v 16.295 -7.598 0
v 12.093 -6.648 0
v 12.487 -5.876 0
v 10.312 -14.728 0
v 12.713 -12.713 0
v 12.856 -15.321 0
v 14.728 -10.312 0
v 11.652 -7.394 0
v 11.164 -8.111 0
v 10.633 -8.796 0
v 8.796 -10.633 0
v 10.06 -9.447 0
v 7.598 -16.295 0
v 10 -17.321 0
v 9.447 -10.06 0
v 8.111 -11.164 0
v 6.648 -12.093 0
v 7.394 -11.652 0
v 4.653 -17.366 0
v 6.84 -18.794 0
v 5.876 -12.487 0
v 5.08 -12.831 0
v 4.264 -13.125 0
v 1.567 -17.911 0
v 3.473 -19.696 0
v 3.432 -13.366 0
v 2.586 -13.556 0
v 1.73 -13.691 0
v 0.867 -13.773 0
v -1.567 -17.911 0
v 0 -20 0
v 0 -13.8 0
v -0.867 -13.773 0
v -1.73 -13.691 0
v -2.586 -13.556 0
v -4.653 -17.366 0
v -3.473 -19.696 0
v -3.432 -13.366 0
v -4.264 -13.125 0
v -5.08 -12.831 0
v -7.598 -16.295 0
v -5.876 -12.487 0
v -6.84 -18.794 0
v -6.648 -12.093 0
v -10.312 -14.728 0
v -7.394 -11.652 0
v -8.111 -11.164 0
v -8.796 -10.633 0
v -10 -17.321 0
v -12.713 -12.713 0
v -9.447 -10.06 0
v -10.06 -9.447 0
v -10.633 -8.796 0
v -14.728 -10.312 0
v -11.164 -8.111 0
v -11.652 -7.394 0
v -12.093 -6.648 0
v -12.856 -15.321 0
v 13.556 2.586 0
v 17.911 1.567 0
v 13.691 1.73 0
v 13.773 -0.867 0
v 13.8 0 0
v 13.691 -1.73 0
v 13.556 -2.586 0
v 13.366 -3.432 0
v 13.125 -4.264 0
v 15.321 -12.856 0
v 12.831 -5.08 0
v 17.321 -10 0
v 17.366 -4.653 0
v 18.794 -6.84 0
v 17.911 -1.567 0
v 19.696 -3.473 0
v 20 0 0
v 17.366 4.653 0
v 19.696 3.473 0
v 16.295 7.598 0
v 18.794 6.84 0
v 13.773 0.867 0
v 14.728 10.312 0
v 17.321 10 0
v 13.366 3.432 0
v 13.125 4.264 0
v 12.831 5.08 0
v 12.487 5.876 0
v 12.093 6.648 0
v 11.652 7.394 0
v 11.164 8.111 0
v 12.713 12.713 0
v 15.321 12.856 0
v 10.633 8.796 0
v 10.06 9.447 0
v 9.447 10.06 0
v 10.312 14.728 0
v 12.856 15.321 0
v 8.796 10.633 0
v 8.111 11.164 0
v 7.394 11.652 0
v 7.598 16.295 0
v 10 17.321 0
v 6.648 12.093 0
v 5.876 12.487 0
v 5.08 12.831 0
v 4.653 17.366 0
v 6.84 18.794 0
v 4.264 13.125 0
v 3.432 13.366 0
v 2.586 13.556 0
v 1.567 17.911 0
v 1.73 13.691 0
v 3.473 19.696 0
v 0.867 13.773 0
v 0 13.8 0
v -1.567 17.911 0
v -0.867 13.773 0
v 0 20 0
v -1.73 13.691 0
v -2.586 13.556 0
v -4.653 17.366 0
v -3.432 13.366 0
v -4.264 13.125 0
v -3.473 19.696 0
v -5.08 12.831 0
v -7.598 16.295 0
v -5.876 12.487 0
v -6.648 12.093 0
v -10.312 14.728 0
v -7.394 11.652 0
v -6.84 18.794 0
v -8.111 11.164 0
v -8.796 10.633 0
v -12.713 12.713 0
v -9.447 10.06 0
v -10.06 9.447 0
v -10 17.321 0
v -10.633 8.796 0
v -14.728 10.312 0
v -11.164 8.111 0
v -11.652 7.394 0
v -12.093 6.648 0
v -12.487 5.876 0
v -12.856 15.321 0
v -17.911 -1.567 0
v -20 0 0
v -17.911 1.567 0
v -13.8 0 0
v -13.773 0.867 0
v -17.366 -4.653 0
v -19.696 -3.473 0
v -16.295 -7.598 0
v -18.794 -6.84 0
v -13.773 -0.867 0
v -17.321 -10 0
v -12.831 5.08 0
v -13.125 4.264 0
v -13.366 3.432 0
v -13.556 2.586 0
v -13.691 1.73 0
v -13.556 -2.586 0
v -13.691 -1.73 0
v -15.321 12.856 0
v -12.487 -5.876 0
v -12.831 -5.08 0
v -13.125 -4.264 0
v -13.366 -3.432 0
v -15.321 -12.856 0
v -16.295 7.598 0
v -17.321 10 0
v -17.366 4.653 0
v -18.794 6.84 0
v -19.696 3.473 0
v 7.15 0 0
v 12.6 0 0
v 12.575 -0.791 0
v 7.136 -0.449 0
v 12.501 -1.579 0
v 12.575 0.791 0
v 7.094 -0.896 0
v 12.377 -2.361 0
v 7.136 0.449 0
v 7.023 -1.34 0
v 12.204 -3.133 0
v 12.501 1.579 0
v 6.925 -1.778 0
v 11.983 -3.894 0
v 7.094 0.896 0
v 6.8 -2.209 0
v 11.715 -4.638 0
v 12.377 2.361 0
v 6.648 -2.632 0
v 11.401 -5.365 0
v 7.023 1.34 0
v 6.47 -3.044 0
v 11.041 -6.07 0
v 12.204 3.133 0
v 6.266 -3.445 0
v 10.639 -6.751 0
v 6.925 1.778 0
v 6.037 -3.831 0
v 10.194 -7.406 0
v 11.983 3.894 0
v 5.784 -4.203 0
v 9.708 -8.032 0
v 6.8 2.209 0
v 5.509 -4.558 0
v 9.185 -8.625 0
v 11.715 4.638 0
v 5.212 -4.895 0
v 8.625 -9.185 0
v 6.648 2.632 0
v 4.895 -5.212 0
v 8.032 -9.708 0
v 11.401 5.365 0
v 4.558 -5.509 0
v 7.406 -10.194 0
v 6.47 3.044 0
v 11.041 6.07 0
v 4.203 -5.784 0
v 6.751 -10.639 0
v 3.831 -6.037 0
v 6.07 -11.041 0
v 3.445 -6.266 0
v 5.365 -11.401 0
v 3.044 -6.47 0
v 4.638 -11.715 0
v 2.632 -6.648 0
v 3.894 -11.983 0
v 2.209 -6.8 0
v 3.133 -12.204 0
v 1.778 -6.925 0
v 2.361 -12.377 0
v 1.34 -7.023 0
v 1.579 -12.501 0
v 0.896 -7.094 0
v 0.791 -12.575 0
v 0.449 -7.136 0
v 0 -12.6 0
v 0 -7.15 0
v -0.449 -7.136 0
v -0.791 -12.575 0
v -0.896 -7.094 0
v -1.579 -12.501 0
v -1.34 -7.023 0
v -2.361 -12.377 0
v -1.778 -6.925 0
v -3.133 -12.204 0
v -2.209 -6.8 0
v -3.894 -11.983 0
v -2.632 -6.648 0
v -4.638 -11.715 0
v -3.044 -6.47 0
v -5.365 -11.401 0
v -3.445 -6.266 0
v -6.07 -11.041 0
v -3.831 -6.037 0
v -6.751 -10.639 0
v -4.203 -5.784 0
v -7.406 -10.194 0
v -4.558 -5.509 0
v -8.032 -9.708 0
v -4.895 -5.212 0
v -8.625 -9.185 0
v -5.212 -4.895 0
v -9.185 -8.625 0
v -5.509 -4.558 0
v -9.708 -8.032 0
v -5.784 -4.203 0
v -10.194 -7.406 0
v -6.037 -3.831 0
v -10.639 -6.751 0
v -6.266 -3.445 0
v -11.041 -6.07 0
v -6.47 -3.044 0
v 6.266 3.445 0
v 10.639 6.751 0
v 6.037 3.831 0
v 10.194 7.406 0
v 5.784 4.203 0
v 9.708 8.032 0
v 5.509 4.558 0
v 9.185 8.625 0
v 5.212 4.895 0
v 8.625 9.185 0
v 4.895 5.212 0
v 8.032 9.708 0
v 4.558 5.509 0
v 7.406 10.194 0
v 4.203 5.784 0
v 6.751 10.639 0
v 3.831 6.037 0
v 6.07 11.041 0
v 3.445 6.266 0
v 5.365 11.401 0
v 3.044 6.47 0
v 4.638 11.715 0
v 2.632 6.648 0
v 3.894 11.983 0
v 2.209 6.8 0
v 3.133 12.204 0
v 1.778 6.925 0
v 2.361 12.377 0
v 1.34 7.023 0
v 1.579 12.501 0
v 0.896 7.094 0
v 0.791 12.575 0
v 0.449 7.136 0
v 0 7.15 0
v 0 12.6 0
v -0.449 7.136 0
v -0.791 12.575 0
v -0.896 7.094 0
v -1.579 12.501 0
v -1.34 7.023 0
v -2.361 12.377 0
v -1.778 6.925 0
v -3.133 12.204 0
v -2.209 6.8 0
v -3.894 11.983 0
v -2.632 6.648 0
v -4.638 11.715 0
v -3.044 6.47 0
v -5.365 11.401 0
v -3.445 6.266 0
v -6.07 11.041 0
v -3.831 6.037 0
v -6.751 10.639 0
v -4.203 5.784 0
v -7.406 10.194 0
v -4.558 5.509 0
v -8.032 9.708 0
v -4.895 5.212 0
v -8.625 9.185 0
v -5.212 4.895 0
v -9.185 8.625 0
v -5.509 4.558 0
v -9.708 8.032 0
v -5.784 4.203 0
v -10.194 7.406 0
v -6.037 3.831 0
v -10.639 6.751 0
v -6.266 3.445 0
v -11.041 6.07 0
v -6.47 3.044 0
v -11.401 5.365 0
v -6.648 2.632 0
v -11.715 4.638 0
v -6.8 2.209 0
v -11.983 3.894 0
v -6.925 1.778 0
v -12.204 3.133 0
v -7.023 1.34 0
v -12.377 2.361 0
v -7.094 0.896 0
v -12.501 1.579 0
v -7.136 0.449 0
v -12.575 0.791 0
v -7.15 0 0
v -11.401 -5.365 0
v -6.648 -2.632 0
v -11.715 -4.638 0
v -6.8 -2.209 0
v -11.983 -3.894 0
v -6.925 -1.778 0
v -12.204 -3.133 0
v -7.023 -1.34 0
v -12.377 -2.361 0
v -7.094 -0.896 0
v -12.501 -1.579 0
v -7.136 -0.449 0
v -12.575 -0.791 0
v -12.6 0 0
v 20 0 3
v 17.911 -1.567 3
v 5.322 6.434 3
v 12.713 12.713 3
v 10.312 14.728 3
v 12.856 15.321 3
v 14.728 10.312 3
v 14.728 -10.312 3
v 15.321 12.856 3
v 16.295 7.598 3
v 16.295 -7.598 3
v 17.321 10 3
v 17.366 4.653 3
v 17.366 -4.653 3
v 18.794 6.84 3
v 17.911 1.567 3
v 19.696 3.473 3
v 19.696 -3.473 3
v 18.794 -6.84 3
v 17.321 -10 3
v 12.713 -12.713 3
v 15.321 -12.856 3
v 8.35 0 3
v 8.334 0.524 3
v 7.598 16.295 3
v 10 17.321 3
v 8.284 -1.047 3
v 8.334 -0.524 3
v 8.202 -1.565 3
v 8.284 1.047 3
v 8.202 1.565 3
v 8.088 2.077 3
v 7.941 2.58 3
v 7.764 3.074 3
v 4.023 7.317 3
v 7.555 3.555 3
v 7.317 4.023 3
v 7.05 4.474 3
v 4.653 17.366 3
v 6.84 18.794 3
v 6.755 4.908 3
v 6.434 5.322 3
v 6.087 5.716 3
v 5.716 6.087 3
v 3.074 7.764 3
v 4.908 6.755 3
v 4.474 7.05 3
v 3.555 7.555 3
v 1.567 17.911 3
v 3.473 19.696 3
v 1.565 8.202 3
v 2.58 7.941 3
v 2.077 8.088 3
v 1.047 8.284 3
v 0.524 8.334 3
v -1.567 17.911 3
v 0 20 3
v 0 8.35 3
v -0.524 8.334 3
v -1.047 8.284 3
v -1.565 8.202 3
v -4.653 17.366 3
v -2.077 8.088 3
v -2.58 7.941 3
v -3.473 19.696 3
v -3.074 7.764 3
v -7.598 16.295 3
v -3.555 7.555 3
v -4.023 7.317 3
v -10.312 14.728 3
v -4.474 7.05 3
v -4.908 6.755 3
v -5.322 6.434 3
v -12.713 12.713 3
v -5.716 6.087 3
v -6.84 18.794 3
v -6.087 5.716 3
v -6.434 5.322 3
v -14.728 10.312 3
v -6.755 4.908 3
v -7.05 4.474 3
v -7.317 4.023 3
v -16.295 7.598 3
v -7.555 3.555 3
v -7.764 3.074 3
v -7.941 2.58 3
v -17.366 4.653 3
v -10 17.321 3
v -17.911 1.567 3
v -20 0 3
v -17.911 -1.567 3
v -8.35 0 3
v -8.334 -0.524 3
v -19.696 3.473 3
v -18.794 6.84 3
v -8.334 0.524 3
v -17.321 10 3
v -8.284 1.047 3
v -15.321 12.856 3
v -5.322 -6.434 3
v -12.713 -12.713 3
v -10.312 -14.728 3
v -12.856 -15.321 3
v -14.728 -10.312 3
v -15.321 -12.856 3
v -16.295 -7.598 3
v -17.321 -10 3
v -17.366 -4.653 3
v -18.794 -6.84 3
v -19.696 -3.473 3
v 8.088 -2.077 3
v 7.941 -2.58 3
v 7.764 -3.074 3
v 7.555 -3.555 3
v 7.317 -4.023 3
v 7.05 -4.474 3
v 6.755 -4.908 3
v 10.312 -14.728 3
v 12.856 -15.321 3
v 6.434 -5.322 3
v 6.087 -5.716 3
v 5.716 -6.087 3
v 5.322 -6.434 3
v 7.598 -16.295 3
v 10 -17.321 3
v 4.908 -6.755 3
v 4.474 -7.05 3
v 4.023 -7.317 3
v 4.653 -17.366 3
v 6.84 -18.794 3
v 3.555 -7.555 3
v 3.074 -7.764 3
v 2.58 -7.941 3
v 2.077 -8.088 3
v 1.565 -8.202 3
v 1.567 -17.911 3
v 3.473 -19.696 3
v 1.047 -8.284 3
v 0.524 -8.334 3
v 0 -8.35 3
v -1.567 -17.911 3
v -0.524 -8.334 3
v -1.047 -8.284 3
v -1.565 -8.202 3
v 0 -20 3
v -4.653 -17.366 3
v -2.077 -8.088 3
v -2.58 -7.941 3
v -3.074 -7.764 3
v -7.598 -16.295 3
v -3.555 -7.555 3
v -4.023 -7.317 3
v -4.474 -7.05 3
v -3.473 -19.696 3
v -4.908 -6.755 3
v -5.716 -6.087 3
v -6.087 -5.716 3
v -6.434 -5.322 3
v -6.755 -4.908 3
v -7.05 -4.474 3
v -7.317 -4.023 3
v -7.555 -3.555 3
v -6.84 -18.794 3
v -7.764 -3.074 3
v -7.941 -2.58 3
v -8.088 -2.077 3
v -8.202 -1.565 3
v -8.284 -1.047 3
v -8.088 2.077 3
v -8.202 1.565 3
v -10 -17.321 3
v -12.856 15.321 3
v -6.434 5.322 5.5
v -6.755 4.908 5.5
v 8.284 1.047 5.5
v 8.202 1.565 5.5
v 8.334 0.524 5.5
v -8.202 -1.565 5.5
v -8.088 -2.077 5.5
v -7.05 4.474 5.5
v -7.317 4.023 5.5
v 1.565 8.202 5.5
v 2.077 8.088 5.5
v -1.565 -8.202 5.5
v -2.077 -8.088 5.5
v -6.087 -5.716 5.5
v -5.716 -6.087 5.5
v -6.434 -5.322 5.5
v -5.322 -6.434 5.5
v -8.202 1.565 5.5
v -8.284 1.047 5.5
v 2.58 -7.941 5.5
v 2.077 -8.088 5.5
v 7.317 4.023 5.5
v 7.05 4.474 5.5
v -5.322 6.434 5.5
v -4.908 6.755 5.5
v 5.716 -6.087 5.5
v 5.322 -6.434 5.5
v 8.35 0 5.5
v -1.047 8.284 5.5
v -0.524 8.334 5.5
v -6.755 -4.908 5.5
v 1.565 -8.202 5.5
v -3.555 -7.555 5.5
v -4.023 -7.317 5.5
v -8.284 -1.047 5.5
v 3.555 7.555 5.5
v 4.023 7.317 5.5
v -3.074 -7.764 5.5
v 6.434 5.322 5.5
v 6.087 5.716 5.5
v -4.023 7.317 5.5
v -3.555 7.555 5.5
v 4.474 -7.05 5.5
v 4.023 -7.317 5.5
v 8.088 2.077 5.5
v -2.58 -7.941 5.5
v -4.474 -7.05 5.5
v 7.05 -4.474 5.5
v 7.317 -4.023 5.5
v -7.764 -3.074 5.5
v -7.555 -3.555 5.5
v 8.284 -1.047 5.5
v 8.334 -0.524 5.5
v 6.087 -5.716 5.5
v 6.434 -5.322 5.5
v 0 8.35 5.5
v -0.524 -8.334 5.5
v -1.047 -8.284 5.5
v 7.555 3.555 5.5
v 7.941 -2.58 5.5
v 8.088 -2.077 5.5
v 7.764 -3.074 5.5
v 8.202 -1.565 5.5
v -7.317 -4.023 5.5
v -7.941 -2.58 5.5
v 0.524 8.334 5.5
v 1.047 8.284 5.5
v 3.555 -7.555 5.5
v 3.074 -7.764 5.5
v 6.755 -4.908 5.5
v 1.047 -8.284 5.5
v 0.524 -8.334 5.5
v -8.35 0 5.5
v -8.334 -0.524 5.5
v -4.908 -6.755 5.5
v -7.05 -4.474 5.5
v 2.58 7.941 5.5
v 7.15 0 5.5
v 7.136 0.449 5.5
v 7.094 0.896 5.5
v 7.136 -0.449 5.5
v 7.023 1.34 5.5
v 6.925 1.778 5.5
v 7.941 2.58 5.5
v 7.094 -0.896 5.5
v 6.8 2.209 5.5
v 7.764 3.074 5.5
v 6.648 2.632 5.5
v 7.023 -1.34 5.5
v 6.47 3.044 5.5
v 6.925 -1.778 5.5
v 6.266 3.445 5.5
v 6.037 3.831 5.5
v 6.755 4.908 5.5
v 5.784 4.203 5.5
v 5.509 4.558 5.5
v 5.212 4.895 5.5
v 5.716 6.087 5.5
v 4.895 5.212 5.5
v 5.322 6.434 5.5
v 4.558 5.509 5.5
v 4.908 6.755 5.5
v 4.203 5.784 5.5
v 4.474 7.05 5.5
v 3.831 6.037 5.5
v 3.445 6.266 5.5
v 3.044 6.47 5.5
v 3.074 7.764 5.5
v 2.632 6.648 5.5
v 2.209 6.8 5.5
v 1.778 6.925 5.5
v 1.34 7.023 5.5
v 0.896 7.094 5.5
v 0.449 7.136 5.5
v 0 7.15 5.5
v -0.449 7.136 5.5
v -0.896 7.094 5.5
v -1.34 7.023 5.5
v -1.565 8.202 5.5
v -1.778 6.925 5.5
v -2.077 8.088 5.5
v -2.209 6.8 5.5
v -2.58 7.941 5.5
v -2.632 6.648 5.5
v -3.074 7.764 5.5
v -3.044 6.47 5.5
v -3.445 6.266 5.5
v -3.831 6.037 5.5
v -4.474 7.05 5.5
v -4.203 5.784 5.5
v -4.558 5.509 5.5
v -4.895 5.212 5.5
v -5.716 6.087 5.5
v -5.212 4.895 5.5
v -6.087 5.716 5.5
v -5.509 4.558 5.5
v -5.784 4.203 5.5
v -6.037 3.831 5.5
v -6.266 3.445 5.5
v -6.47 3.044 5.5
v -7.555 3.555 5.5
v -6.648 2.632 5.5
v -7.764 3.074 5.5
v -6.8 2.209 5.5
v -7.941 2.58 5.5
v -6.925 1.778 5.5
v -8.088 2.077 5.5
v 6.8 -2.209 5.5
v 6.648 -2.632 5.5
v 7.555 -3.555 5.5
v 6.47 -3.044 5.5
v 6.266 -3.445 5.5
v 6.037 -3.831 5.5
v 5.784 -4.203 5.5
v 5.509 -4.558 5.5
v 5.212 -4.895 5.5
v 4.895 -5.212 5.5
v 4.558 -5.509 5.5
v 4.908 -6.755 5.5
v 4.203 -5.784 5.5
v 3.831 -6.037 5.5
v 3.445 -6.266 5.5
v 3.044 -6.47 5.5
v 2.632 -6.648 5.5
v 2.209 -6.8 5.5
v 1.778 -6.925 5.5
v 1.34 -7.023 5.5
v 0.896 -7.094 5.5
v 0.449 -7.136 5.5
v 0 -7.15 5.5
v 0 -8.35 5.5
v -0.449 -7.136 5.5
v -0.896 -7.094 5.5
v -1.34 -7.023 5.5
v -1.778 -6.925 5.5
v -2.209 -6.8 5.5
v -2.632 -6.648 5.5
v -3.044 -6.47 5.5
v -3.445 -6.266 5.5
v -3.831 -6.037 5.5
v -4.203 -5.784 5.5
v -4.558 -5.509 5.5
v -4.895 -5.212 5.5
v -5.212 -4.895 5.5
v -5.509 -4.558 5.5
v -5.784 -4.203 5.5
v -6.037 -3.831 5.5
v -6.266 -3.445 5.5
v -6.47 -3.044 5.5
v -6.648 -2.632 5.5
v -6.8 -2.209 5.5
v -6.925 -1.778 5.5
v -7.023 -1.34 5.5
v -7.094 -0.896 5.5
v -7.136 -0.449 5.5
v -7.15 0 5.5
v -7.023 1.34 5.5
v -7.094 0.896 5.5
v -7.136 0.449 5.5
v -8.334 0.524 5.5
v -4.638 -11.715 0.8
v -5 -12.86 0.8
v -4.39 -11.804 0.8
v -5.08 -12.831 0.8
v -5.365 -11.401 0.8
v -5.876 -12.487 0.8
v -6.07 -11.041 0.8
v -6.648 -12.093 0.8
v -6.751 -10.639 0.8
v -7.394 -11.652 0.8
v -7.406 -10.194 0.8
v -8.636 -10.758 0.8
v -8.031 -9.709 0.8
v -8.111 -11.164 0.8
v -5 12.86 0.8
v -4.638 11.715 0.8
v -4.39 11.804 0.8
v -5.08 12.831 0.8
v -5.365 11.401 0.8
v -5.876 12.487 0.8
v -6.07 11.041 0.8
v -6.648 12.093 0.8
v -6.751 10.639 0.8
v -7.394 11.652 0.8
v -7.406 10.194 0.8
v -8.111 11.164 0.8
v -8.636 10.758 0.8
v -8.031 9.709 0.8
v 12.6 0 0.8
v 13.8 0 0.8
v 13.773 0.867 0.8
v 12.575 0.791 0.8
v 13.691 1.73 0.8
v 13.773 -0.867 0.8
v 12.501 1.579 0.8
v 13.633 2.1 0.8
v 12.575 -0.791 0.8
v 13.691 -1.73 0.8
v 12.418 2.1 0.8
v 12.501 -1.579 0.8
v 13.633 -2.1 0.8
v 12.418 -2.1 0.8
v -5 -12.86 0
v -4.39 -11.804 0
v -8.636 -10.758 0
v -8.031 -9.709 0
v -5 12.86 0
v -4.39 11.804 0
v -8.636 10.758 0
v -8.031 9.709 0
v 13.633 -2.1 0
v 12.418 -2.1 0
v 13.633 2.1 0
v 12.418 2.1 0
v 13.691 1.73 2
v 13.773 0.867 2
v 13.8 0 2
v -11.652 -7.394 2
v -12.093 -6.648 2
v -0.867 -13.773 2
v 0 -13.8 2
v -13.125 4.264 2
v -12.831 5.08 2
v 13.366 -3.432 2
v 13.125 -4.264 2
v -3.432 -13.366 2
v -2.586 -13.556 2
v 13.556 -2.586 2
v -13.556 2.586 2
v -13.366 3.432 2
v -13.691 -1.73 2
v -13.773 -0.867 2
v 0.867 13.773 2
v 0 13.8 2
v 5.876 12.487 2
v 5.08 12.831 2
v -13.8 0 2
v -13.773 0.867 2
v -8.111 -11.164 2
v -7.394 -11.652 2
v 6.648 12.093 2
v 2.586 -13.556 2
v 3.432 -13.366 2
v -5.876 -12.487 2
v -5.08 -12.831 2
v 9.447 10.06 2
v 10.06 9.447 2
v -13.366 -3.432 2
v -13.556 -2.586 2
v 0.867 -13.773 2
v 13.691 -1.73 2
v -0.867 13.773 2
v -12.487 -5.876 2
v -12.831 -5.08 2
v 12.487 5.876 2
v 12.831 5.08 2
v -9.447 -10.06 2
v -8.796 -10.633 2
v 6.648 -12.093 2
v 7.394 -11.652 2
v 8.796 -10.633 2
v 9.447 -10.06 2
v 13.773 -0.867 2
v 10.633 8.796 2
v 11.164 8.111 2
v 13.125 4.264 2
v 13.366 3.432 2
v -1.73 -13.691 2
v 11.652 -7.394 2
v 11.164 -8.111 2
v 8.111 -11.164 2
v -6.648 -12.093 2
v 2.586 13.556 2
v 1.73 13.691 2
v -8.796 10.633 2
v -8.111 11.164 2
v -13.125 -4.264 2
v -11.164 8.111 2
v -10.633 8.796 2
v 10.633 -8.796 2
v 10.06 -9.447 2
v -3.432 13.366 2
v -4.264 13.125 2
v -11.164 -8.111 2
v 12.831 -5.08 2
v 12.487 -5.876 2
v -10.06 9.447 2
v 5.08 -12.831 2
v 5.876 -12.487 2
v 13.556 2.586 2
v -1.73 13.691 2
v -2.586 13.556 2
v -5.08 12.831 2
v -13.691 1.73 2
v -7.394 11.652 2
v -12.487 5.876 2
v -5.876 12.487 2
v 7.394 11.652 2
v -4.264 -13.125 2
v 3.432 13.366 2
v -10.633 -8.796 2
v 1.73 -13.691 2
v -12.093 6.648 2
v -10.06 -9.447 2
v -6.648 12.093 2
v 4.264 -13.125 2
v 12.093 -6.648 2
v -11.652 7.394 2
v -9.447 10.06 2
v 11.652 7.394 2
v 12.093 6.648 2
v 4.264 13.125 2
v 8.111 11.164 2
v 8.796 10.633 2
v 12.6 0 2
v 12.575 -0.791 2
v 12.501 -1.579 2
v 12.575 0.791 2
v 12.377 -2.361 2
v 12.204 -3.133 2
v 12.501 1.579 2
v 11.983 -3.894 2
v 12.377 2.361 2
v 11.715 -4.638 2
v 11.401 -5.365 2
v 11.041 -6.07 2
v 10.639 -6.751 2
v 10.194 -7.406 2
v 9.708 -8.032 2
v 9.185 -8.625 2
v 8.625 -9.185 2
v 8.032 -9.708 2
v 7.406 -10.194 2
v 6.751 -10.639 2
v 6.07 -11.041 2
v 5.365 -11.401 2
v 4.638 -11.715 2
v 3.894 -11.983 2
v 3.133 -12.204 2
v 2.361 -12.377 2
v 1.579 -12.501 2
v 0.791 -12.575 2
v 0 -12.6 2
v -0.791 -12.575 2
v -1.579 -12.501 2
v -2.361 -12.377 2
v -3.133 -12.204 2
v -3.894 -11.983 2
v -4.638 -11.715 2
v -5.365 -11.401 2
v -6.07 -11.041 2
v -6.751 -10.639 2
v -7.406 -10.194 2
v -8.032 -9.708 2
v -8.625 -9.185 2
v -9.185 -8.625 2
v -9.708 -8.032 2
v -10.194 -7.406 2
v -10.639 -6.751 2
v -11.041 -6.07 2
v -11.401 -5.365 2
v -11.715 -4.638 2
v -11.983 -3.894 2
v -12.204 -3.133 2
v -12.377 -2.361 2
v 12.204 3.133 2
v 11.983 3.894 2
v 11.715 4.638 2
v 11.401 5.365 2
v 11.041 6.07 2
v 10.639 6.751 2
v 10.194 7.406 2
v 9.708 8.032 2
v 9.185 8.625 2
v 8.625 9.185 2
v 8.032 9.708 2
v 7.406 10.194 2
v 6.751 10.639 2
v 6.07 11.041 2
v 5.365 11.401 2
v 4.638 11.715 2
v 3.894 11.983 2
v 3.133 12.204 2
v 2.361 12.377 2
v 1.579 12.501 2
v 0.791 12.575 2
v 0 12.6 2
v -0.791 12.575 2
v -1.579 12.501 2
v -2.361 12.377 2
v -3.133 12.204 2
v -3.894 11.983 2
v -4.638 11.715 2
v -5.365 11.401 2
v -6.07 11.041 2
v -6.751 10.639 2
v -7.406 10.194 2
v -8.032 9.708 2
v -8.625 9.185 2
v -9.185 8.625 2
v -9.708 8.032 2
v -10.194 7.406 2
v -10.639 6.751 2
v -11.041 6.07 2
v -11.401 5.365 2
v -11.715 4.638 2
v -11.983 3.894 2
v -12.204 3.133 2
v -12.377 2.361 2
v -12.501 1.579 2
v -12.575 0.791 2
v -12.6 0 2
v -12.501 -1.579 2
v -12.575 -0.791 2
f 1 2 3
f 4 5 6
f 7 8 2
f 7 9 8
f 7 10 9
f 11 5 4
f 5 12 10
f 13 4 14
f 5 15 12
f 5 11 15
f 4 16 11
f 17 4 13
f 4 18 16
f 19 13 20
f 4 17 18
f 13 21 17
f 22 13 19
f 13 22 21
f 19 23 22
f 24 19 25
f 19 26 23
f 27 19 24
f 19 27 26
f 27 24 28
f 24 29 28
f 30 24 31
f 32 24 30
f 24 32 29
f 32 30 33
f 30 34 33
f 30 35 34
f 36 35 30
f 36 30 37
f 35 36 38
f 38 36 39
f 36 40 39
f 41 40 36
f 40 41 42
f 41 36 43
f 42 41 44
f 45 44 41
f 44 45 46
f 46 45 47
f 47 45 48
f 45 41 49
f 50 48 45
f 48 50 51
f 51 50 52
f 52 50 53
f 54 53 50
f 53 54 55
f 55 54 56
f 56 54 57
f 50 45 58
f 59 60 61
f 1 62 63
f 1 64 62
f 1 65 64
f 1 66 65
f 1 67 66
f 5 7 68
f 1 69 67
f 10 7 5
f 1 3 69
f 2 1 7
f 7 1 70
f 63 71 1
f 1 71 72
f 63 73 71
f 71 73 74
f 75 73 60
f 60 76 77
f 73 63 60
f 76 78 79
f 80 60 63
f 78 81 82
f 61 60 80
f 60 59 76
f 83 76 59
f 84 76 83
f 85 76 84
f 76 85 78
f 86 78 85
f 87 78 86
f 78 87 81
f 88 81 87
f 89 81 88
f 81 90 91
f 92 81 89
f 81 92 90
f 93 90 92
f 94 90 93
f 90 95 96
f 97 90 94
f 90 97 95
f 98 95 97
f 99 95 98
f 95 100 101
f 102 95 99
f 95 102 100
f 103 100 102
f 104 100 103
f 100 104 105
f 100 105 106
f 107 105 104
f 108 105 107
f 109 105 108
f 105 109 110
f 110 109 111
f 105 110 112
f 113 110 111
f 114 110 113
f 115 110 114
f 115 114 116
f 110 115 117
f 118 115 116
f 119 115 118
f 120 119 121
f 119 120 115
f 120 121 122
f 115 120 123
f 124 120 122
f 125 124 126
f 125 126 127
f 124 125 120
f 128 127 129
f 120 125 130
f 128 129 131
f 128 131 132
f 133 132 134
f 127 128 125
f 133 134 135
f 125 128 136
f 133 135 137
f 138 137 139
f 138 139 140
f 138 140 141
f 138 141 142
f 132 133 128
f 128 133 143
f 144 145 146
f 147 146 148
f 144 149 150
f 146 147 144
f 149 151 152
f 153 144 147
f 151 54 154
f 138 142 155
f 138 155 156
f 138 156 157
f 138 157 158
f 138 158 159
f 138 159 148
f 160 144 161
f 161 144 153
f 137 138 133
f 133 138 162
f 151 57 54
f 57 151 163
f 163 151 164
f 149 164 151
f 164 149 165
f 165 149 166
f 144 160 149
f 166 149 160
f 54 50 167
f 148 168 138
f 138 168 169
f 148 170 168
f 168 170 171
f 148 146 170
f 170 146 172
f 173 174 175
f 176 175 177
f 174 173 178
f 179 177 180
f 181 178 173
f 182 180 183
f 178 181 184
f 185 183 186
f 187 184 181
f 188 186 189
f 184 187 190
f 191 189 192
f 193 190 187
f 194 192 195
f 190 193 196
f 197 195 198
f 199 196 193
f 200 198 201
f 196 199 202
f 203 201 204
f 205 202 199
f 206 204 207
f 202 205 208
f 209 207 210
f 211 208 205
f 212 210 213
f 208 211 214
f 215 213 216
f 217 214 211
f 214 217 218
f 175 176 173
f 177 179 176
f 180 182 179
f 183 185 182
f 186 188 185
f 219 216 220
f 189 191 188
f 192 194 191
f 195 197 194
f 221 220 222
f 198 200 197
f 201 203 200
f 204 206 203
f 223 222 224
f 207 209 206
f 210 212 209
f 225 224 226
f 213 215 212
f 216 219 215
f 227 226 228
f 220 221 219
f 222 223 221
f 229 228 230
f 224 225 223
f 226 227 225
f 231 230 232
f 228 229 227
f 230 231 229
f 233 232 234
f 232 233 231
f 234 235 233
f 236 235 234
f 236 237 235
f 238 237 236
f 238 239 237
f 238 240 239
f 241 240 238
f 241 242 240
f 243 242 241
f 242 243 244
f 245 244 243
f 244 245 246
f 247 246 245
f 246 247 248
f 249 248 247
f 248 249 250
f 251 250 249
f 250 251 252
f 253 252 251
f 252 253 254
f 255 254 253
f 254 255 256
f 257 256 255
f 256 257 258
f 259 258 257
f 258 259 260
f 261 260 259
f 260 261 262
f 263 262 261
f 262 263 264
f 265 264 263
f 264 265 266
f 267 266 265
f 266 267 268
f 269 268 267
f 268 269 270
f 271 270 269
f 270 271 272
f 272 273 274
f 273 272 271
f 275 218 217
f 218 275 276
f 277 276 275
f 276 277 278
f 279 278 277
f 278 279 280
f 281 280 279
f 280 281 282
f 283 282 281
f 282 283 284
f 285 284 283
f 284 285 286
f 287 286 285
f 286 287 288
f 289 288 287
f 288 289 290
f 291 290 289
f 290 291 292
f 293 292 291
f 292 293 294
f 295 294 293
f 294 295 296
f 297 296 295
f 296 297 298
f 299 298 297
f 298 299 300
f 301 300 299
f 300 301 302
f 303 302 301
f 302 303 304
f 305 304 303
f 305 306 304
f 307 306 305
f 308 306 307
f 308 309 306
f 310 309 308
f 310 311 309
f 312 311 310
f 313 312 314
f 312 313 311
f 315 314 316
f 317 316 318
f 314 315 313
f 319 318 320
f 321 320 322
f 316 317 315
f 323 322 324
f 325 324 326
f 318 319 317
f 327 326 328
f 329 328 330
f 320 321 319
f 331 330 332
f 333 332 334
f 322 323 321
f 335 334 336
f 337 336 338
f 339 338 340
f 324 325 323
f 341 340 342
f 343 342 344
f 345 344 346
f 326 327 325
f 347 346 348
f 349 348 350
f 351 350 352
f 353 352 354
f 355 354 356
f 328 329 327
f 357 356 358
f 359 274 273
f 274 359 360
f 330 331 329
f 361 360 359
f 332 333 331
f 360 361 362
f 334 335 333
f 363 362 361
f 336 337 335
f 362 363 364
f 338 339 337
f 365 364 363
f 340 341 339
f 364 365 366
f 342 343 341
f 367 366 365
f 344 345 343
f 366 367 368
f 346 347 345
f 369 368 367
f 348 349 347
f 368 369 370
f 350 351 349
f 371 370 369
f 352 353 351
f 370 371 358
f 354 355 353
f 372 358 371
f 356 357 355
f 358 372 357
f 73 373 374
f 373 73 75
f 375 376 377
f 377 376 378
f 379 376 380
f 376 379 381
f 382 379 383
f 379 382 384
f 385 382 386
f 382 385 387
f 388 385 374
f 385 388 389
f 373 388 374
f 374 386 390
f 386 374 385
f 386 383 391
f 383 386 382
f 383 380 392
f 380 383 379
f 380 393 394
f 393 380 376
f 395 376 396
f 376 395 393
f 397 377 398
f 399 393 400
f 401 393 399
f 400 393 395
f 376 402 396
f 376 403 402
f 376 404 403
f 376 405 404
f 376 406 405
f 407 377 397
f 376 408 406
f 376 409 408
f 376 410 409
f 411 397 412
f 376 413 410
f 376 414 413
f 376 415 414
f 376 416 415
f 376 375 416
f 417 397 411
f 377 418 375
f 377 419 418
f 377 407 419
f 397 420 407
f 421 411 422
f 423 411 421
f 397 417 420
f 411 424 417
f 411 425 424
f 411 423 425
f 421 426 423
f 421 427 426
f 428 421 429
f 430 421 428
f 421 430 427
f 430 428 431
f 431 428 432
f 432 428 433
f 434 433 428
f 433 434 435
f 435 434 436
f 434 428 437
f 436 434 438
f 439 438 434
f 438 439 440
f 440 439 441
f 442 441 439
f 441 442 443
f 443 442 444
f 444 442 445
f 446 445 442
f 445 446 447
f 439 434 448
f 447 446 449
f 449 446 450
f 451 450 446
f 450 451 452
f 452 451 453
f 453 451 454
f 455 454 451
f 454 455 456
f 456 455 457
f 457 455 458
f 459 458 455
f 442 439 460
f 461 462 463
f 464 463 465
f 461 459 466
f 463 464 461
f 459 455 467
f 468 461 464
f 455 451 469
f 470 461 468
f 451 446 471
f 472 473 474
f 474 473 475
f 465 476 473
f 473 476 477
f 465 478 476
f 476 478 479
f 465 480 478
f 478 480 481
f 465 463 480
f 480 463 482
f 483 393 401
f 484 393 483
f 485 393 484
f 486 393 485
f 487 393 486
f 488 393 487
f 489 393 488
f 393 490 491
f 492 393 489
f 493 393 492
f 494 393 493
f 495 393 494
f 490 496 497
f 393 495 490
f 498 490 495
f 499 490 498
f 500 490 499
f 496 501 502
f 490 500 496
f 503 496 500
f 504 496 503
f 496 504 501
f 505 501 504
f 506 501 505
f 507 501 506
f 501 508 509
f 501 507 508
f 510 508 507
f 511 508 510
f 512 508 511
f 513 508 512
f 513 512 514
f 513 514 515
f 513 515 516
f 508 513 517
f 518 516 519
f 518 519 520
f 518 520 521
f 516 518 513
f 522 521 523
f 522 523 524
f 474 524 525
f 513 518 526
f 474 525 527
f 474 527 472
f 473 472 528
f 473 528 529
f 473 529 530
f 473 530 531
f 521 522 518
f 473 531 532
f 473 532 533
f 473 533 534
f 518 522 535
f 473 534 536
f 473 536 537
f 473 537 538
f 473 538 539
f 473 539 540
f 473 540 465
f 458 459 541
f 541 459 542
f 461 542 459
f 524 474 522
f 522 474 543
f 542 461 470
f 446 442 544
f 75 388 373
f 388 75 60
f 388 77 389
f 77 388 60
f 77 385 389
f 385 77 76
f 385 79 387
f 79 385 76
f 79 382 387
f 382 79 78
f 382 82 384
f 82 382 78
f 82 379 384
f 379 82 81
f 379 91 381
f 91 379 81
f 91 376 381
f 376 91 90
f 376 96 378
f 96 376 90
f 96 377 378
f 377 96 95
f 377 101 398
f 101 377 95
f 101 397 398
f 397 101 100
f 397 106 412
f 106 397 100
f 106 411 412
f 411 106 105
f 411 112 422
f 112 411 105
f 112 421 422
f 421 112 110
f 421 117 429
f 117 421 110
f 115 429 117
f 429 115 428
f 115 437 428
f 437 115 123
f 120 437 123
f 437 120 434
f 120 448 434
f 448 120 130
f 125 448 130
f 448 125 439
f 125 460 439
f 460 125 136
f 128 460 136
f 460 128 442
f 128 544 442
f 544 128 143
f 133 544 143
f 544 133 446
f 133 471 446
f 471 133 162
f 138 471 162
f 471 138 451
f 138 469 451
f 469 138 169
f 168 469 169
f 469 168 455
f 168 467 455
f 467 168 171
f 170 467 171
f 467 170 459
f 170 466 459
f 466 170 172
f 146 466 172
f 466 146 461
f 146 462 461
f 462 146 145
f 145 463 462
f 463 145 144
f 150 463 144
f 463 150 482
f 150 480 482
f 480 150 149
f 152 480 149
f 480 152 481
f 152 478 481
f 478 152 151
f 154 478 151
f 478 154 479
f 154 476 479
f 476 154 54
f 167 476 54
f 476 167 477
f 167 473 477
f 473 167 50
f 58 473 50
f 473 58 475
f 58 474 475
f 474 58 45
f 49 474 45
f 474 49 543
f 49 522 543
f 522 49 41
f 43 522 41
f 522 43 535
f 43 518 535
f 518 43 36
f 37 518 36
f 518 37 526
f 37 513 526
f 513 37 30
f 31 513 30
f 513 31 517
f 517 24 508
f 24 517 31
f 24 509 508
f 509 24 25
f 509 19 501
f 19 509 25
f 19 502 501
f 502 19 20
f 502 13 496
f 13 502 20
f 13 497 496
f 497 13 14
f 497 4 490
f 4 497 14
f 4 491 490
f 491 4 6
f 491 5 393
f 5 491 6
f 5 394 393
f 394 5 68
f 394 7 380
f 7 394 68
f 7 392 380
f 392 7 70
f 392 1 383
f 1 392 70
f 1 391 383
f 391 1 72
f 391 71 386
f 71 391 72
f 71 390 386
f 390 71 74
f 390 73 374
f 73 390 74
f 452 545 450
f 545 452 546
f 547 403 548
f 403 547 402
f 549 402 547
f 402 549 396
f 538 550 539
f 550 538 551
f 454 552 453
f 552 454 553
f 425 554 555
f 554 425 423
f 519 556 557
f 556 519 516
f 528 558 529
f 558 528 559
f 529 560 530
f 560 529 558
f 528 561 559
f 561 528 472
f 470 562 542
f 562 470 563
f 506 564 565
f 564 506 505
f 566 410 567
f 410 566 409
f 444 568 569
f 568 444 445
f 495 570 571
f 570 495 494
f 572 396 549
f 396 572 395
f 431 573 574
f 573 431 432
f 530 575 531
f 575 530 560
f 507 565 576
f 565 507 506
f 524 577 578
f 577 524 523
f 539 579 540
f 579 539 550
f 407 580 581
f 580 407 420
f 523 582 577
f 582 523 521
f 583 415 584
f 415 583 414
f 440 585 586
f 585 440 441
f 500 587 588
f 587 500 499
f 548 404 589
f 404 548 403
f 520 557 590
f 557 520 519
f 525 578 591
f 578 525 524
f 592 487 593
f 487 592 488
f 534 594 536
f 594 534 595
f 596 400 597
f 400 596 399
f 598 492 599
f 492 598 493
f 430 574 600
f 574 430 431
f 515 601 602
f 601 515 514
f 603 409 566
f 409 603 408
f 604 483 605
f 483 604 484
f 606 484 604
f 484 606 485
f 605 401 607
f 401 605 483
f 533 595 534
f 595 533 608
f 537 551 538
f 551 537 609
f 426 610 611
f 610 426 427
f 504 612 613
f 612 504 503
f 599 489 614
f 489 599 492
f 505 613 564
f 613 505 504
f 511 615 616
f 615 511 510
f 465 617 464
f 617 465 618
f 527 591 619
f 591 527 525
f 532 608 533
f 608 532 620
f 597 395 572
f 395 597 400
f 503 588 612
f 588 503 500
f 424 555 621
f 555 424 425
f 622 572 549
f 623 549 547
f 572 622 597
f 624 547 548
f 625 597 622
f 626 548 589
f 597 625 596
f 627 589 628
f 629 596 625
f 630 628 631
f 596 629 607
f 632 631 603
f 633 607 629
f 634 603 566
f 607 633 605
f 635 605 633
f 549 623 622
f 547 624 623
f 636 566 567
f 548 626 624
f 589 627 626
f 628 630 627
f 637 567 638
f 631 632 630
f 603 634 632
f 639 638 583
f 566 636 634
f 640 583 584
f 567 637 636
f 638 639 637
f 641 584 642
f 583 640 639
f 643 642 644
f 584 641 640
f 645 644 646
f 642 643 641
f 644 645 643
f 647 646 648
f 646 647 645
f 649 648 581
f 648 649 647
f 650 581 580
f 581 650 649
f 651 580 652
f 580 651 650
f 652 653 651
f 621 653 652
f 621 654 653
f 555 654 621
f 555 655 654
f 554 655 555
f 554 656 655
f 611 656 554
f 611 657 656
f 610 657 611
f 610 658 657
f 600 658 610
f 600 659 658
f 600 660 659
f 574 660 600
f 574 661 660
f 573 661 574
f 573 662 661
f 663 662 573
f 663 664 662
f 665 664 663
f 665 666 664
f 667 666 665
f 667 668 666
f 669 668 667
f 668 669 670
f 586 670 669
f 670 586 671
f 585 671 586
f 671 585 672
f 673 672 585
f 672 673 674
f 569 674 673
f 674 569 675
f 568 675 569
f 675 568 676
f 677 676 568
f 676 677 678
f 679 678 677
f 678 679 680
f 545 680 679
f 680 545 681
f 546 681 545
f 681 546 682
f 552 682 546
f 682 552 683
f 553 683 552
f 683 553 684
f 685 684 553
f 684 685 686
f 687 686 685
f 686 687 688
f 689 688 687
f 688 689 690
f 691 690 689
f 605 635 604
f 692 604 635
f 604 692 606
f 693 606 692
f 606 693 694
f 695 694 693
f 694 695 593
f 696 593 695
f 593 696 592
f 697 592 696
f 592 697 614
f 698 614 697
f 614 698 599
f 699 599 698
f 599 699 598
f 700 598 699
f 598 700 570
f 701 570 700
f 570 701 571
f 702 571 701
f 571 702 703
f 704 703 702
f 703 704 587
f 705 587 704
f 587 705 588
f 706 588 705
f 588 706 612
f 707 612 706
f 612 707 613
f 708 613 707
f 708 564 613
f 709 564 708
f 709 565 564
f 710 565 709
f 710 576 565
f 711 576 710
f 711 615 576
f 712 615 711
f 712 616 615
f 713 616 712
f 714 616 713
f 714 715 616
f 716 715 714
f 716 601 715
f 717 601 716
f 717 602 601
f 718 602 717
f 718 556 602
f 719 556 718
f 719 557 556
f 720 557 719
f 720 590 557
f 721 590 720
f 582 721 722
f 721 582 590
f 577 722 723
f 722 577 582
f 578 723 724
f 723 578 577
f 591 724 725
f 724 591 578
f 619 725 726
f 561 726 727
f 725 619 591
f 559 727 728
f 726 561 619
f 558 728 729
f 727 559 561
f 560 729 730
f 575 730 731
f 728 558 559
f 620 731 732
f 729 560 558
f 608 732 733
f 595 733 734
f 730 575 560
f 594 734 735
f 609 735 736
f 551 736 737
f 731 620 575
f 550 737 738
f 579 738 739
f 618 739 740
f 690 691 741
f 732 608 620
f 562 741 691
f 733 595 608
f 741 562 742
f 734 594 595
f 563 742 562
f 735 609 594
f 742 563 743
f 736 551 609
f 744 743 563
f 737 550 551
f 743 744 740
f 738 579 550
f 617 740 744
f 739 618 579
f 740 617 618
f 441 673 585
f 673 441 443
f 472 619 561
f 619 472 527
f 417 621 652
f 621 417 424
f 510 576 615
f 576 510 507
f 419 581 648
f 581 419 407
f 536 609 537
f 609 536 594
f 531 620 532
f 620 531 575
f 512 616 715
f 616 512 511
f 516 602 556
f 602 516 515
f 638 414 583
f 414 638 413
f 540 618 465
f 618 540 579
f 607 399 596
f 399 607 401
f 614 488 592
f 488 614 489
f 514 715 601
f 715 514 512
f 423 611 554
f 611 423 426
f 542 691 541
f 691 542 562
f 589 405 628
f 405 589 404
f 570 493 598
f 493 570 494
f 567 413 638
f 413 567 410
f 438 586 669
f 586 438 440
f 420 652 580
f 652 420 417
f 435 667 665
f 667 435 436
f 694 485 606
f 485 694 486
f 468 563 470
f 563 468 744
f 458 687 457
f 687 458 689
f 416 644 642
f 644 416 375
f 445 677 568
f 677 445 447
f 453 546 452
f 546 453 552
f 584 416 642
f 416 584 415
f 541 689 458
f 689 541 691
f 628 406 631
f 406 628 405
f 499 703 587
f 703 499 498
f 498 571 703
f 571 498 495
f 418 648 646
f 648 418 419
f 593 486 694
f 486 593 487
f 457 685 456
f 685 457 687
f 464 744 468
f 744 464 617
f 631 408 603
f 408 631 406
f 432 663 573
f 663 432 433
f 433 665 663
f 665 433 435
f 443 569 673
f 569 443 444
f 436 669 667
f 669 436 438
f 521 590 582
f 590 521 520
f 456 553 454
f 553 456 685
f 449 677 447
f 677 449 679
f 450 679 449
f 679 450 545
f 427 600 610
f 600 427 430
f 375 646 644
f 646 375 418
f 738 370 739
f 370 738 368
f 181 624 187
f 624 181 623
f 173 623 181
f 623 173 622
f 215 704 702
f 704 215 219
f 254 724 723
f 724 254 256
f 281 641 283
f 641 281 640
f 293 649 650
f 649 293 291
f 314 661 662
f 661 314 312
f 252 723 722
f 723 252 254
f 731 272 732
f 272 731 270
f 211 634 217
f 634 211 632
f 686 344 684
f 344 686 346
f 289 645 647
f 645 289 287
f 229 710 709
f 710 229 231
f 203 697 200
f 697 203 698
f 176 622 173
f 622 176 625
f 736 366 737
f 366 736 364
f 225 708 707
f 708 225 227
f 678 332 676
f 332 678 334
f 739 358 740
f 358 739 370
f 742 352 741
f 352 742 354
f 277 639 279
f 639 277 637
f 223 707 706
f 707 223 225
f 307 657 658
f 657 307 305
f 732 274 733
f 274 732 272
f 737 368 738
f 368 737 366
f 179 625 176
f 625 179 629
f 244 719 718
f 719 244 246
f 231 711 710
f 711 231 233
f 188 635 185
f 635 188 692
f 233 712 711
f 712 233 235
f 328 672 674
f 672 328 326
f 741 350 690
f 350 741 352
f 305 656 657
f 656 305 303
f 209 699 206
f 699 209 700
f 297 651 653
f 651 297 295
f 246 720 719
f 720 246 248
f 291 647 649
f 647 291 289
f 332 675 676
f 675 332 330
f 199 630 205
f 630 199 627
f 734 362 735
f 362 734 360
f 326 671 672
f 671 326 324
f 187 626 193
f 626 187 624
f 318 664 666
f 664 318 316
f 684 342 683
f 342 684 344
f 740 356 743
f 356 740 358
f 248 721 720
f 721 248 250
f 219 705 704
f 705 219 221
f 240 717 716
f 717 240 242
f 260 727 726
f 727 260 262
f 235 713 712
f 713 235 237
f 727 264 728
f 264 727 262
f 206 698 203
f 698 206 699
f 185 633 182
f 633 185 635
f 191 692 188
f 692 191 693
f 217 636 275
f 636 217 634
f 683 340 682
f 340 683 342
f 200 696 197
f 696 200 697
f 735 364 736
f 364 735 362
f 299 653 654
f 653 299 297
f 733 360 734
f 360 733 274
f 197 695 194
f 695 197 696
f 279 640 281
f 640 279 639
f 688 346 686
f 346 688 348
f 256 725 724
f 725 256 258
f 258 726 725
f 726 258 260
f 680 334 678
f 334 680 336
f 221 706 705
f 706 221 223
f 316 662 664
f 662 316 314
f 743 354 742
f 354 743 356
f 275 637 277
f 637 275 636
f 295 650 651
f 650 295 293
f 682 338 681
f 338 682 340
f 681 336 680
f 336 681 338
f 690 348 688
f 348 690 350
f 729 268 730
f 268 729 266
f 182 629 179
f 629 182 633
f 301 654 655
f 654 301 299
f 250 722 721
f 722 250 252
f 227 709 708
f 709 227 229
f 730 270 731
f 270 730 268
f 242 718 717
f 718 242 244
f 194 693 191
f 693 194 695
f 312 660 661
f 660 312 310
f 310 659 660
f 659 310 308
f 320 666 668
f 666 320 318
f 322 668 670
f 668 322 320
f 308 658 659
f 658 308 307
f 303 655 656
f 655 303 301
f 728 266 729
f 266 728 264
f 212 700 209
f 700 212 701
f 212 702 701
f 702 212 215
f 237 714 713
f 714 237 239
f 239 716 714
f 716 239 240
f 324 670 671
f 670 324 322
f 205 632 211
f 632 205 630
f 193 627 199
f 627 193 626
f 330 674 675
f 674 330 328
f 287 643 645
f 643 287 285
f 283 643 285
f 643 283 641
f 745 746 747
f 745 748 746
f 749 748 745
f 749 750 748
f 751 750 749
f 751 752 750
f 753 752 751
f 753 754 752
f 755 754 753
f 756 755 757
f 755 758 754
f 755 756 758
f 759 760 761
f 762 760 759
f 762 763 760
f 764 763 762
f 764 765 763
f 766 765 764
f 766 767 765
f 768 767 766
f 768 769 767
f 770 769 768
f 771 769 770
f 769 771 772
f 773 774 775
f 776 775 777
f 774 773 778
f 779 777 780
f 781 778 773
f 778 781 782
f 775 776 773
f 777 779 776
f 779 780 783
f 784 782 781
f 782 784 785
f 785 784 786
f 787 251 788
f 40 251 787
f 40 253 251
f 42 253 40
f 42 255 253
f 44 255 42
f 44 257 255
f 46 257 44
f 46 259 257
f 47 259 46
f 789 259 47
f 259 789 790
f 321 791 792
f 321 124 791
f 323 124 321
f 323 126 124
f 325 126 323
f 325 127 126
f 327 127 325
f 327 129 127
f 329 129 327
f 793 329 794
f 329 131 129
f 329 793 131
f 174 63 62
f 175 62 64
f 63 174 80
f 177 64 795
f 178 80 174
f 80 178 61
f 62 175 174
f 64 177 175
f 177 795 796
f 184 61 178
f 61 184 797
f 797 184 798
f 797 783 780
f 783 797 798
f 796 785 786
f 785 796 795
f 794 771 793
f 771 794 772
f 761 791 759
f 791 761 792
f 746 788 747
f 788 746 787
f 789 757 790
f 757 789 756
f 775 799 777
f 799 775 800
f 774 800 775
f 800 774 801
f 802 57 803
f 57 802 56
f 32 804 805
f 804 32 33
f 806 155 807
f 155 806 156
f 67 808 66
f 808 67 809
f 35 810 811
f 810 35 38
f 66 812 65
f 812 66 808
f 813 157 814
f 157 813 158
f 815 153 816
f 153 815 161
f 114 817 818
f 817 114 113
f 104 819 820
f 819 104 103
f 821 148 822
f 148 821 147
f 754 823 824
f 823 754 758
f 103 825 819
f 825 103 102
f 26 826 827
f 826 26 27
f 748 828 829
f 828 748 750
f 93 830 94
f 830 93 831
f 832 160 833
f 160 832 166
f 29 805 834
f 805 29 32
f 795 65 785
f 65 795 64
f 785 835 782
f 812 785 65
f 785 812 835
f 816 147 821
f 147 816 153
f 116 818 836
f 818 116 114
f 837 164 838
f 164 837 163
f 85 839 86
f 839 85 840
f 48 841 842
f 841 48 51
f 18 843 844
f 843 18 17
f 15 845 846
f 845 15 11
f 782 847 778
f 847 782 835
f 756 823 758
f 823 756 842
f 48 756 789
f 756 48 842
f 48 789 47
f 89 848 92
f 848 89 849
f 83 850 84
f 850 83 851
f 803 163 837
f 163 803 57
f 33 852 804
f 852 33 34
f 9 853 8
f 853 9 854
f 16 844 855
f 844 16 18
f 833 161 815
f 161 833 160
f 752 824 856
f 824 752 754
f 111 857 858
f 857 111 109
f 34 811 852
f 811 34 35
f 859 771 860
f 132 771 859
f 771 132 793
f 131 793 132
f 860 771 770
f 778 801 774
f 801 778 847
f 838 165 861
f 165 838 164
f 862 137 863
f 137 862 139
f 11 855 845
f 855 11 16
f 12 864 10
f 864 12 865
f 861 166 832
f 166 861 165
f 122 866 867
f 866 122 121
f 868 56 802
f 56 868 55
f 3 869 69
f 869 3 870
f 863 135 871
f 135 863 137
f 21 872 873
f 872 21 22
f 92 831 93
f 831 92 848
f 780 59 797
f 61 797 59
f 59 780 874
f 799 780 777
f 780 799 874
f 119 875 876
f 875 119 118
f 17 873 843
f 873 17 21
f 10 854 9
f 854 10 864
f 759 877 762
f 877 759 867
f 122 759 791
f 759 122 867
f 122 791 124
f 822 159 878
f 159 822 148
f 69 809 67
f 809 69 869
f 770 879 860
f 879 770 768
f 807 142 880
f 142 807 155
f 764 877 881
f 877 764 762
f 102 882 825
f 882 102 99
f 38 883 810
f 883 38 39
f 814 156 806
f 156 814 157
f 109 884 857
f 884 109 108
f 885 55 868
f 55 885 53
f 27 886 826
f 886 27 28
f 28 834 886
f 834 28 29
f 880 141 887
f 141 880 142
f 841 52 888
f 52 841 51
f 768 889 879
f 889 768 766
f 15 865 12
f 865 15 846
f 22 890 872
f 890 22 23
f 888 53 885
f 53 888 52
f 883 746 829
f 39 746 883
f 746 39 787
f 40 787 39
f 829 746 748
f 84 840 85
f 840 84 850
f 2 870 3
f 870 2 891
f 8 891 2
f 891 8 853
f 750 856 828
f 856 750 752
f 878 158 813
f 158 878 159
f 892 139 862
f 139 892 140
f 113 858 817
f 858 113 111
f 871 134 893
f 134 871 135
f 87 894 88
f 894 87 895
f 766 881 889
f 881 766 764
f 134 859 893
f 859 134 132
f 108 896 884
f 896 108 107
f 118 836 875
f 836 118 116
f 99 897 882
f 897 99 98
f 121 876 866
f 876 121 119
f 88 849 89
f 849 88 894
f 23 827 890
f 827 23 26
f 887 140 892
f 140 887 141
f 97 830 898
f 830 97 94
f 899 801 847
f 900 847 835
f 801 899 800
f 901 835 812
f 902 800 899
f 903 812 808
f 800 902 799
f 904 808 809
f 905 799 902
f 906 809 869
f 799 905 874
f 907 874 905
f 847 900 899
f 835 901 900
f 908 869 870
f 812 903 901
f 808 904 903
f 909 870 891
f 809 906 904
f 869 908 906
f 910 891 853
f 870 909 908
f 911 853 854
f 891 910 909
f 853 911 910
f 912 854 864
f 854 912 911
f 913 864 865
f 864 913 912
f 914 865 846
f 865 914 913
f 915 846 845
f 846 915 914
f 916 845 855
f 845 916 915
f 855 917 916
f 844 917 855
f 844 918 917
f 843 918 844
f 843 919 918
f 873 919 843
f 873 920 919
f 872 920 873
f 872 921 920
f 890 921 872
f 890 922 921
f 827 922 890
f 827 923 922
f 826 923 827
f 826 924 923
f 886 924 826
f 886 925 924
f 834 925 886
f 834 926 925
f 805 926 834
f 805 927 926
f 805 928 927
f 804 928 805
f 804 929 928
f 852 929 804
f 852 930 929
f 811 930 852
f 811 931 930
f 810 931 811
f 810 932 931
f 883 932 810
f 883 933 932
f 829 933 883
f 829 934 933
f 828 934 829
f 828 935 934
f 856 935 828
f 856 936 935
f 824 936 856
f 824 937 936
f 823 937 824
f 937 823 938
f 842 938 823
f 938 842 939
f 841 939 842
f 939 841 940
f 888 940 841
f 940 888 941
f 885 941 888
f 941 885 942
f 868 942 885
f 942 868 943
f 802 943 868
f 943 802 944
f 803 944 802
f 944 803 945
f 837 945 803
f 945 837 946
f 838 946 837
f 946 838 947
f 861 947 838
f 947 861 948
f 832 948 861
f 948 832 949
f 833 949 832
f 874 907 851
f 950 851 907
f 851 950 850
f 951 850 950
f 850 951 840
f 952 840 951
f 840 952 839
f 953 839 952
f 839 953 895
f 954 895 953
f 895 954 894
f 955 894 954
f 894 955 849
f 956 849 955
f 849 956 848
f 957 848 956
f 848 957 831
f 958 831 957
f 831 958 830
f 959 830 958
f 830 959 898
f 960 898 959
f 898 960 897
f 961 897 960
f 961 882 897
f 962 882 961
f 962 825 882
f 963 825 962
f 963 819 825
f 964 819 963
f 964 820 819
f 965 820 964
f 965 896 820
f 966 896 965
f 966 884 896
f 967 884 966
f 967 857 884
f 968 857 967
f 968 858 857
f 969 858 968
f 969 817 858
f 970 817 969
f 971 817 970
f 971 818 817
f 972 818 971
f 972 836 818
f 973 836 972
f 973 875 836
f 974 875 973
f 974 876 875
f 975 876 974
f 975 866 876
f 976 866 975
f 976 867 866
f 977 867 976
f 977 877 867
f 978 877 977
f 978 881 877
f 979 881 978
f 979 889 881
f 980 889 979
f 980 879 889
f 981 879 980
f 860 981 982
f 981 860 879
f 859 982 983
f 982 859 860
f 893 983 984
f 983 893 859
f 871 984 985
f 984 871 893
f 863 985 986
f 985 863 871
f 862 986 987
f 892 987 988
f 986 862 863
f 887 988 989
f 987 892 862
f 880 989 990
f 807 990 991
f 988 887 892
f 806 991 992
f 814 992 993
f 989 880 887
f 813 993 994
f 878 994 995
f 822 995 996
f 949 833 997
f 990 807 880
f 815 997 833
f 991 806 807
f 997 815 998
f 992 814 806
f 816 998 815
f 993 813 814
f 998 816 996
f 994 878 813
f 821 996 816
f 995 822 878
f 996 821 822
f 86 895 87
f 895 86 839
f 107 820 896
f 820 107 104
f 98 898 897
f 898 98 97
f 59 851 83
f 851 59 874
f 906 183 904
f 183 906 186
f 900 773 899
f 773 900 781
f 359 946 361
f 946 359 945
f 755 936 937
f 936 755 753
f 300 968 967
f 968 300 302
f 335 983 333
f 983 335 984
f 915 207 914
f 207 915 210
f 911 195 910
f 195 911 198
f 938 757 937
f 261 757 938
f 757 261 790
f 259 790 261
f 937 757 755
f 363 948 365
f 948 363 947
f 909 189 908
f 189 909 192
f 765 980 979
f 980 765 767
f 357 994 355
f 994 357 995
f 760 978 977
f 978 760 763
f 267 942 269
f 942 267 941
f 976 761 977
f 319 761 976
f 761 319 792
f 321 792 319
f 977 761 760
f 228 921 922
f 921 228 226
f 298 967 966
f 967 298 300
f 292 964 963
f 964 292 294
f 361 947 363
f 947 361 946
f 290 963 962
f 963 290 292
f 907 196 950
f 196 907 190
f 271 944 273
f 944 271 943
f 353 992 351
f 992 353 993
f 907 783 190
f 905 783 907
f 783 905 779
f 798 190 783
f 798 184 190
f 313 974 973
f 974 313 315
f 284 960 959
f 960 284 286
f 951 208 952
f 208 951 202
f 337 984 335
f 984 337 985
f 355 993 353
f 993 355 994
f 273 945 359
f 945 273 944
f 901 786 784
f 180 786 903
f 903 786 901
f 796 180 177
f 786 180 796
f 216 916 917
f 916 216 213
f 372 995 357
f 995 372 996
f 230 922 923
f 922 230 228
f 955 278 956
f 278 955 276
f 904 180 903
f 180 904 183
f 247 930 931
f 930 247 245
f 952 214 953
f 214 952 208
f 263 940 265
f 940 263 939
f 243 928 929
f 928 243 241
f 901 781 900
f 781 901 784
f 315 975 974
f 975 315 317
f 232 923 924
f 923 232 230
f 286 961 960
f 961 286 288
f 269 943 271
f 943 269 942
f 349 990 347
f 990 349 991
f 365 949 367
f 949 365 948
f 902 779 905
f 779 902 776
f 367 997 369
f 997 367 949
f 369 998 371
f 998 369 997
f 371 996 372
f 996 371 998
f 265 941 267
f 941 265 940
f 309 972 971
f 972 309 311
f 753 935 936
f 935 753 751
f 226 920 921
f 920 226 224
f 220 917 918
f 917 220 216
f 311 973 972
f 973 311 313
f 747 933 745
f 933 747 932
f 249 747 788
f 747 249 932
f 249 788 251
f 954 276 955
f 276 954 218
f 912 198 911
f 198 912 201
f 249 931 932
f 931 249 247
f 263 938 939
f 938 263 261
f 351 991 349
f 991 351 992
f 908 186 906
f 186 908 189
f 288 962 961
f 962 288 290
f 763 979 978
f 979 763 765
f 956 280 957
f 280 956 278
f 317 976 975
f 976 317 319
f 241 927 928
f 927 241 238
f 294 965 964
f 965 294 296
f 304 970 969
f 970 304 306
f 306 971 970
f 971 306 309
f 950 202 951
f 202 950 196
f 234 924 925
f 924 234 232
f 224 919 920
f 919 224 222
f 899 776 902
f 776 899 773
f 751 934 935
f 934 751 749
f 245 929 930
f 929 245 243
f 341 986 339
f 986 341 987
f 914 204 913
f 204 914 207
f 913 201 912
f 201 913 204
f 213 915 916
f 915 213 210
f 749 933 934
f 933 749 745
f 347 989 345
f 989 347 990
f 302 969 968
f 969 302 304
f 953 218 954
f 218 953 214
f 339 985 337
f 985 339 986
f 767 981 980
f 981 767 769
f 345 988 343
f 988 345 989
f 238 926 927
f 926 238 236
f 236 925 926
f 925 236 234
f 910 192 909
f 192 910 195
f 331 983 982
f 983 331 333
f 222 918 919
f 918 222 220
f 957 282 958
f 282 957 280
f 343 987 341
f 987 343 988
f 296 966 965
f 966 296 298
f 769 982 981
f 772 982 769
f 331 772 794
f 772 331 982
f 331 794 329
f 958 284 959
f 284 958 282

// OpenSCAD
/*
    With this code you can make a focus wheel extension for the M12 lenses used in the FluoPi project.
    
    Isaac Núñez 2020 (CC BY 4.0; https://creativecommons.org/licenses/by/4.0/) 
 
*/


////////////////////////////////////
//  Parameters  //

// This values have to be the same as in the filter holder to them to be compatible
ri = 12.6;
side_thick = 1*1.2 ; // 1.2 times to let the clam enter
h_clam = 2;
h = h_clam * 2;
thick_frac = 0.4 ; // free space fraction of clam thickness
free_clam_space = 4.2;
angles1 = [0,120,240];
angles2 = [20,140,260]; // 2 more degree to let the clam enter
// until here

///////////////
//wheel values

r_wheel = 20; //wheel radii
w_thick = 3;
thoot_size = 2; //

/////////////////
// M12 aperture

M12_ri = 7.15 ;
M12_side_thick = 2.5;
aperture_h = w_thick + 2; 

angles_M12 = [0,180];
free_M12 = 10;

M12_re = M12_ri + side_thick;


rb = ri-1;
re = ri +side_thick;

//////////////
// Moldules //

module clam_space(length, wide, thickness, angles){

for(ang = angles){
   rotate([0,0,ang])
    translate([length/2, 0, 0])
   cube([length, wide, thickness], center = true);
}
}

module wheel(){
    
    difference(){
        union(){
for(ang = [0:10:350]){
   rotate([0,0,ang])
    translate([0, 0, 0])
        linear_extrude(height = w_thick, center = true, convexity = 10, twist = 0)
   polygon(points=[[0,-r_wheel*3/4],[0,r_wheel*3/4],[r_wheel,0]]);
}
translate([0,0,w_thick/2]) 
    linear_extrude(height = aperture_h, center = true, convexity = 10, twist = 0,$fn = 100)
circle(M12_re);
}

            translate([0,0,w_thick/2]) 
linear_extrude(height = aperture_h*1.5, center = true, convexity = 10, twist = 0,$fn = 100)
circle(M12_ri);
/*
intersection(){
    translate([0,0,w_thick/2]) 
    linear_extrude(height = total_h, center = true, convexity = 10, twist = 0,$fn = 100)
circle(M12_re-1);
                      translate([0,0,w_thick/2]) 
        clam_space(M12_re, free_M12 ,total_h, angles_M12);
}
*/
}
}


module clam(){

    difference(){
linear_extrude(height = h, center = true, convexity = 10, twist = 0,$fn = 100)
circle(re);

        linear_extrude(height = h*1.1, center = true, convexity = 10, twist = 0,$fn = 100)

circle(ri);
                                                translate([0,0,h/2-h_clam*(1-thick_frac) - h_clam*thick_frac/2])  
        clam_space(re*1.5, free_clam_space ,h_clam*thick_frac, angles1);
        
        translate([0,0,h/2- h_clam/2]) 
           intersection() {                         
        clam_space(re*1.5, free_clam_space ,h_clam, angles1);
                             
        clam_space(re*1.5, free_clam_space ,h_clam, angles2);
       
}            
    }

}
///////////////////////////
// Create the focus knob //

difference(){
    translate([0,0,w_thick/2]) 
wheel();
translate([0,0,-h/2+h_clam]) 
clam();
}
